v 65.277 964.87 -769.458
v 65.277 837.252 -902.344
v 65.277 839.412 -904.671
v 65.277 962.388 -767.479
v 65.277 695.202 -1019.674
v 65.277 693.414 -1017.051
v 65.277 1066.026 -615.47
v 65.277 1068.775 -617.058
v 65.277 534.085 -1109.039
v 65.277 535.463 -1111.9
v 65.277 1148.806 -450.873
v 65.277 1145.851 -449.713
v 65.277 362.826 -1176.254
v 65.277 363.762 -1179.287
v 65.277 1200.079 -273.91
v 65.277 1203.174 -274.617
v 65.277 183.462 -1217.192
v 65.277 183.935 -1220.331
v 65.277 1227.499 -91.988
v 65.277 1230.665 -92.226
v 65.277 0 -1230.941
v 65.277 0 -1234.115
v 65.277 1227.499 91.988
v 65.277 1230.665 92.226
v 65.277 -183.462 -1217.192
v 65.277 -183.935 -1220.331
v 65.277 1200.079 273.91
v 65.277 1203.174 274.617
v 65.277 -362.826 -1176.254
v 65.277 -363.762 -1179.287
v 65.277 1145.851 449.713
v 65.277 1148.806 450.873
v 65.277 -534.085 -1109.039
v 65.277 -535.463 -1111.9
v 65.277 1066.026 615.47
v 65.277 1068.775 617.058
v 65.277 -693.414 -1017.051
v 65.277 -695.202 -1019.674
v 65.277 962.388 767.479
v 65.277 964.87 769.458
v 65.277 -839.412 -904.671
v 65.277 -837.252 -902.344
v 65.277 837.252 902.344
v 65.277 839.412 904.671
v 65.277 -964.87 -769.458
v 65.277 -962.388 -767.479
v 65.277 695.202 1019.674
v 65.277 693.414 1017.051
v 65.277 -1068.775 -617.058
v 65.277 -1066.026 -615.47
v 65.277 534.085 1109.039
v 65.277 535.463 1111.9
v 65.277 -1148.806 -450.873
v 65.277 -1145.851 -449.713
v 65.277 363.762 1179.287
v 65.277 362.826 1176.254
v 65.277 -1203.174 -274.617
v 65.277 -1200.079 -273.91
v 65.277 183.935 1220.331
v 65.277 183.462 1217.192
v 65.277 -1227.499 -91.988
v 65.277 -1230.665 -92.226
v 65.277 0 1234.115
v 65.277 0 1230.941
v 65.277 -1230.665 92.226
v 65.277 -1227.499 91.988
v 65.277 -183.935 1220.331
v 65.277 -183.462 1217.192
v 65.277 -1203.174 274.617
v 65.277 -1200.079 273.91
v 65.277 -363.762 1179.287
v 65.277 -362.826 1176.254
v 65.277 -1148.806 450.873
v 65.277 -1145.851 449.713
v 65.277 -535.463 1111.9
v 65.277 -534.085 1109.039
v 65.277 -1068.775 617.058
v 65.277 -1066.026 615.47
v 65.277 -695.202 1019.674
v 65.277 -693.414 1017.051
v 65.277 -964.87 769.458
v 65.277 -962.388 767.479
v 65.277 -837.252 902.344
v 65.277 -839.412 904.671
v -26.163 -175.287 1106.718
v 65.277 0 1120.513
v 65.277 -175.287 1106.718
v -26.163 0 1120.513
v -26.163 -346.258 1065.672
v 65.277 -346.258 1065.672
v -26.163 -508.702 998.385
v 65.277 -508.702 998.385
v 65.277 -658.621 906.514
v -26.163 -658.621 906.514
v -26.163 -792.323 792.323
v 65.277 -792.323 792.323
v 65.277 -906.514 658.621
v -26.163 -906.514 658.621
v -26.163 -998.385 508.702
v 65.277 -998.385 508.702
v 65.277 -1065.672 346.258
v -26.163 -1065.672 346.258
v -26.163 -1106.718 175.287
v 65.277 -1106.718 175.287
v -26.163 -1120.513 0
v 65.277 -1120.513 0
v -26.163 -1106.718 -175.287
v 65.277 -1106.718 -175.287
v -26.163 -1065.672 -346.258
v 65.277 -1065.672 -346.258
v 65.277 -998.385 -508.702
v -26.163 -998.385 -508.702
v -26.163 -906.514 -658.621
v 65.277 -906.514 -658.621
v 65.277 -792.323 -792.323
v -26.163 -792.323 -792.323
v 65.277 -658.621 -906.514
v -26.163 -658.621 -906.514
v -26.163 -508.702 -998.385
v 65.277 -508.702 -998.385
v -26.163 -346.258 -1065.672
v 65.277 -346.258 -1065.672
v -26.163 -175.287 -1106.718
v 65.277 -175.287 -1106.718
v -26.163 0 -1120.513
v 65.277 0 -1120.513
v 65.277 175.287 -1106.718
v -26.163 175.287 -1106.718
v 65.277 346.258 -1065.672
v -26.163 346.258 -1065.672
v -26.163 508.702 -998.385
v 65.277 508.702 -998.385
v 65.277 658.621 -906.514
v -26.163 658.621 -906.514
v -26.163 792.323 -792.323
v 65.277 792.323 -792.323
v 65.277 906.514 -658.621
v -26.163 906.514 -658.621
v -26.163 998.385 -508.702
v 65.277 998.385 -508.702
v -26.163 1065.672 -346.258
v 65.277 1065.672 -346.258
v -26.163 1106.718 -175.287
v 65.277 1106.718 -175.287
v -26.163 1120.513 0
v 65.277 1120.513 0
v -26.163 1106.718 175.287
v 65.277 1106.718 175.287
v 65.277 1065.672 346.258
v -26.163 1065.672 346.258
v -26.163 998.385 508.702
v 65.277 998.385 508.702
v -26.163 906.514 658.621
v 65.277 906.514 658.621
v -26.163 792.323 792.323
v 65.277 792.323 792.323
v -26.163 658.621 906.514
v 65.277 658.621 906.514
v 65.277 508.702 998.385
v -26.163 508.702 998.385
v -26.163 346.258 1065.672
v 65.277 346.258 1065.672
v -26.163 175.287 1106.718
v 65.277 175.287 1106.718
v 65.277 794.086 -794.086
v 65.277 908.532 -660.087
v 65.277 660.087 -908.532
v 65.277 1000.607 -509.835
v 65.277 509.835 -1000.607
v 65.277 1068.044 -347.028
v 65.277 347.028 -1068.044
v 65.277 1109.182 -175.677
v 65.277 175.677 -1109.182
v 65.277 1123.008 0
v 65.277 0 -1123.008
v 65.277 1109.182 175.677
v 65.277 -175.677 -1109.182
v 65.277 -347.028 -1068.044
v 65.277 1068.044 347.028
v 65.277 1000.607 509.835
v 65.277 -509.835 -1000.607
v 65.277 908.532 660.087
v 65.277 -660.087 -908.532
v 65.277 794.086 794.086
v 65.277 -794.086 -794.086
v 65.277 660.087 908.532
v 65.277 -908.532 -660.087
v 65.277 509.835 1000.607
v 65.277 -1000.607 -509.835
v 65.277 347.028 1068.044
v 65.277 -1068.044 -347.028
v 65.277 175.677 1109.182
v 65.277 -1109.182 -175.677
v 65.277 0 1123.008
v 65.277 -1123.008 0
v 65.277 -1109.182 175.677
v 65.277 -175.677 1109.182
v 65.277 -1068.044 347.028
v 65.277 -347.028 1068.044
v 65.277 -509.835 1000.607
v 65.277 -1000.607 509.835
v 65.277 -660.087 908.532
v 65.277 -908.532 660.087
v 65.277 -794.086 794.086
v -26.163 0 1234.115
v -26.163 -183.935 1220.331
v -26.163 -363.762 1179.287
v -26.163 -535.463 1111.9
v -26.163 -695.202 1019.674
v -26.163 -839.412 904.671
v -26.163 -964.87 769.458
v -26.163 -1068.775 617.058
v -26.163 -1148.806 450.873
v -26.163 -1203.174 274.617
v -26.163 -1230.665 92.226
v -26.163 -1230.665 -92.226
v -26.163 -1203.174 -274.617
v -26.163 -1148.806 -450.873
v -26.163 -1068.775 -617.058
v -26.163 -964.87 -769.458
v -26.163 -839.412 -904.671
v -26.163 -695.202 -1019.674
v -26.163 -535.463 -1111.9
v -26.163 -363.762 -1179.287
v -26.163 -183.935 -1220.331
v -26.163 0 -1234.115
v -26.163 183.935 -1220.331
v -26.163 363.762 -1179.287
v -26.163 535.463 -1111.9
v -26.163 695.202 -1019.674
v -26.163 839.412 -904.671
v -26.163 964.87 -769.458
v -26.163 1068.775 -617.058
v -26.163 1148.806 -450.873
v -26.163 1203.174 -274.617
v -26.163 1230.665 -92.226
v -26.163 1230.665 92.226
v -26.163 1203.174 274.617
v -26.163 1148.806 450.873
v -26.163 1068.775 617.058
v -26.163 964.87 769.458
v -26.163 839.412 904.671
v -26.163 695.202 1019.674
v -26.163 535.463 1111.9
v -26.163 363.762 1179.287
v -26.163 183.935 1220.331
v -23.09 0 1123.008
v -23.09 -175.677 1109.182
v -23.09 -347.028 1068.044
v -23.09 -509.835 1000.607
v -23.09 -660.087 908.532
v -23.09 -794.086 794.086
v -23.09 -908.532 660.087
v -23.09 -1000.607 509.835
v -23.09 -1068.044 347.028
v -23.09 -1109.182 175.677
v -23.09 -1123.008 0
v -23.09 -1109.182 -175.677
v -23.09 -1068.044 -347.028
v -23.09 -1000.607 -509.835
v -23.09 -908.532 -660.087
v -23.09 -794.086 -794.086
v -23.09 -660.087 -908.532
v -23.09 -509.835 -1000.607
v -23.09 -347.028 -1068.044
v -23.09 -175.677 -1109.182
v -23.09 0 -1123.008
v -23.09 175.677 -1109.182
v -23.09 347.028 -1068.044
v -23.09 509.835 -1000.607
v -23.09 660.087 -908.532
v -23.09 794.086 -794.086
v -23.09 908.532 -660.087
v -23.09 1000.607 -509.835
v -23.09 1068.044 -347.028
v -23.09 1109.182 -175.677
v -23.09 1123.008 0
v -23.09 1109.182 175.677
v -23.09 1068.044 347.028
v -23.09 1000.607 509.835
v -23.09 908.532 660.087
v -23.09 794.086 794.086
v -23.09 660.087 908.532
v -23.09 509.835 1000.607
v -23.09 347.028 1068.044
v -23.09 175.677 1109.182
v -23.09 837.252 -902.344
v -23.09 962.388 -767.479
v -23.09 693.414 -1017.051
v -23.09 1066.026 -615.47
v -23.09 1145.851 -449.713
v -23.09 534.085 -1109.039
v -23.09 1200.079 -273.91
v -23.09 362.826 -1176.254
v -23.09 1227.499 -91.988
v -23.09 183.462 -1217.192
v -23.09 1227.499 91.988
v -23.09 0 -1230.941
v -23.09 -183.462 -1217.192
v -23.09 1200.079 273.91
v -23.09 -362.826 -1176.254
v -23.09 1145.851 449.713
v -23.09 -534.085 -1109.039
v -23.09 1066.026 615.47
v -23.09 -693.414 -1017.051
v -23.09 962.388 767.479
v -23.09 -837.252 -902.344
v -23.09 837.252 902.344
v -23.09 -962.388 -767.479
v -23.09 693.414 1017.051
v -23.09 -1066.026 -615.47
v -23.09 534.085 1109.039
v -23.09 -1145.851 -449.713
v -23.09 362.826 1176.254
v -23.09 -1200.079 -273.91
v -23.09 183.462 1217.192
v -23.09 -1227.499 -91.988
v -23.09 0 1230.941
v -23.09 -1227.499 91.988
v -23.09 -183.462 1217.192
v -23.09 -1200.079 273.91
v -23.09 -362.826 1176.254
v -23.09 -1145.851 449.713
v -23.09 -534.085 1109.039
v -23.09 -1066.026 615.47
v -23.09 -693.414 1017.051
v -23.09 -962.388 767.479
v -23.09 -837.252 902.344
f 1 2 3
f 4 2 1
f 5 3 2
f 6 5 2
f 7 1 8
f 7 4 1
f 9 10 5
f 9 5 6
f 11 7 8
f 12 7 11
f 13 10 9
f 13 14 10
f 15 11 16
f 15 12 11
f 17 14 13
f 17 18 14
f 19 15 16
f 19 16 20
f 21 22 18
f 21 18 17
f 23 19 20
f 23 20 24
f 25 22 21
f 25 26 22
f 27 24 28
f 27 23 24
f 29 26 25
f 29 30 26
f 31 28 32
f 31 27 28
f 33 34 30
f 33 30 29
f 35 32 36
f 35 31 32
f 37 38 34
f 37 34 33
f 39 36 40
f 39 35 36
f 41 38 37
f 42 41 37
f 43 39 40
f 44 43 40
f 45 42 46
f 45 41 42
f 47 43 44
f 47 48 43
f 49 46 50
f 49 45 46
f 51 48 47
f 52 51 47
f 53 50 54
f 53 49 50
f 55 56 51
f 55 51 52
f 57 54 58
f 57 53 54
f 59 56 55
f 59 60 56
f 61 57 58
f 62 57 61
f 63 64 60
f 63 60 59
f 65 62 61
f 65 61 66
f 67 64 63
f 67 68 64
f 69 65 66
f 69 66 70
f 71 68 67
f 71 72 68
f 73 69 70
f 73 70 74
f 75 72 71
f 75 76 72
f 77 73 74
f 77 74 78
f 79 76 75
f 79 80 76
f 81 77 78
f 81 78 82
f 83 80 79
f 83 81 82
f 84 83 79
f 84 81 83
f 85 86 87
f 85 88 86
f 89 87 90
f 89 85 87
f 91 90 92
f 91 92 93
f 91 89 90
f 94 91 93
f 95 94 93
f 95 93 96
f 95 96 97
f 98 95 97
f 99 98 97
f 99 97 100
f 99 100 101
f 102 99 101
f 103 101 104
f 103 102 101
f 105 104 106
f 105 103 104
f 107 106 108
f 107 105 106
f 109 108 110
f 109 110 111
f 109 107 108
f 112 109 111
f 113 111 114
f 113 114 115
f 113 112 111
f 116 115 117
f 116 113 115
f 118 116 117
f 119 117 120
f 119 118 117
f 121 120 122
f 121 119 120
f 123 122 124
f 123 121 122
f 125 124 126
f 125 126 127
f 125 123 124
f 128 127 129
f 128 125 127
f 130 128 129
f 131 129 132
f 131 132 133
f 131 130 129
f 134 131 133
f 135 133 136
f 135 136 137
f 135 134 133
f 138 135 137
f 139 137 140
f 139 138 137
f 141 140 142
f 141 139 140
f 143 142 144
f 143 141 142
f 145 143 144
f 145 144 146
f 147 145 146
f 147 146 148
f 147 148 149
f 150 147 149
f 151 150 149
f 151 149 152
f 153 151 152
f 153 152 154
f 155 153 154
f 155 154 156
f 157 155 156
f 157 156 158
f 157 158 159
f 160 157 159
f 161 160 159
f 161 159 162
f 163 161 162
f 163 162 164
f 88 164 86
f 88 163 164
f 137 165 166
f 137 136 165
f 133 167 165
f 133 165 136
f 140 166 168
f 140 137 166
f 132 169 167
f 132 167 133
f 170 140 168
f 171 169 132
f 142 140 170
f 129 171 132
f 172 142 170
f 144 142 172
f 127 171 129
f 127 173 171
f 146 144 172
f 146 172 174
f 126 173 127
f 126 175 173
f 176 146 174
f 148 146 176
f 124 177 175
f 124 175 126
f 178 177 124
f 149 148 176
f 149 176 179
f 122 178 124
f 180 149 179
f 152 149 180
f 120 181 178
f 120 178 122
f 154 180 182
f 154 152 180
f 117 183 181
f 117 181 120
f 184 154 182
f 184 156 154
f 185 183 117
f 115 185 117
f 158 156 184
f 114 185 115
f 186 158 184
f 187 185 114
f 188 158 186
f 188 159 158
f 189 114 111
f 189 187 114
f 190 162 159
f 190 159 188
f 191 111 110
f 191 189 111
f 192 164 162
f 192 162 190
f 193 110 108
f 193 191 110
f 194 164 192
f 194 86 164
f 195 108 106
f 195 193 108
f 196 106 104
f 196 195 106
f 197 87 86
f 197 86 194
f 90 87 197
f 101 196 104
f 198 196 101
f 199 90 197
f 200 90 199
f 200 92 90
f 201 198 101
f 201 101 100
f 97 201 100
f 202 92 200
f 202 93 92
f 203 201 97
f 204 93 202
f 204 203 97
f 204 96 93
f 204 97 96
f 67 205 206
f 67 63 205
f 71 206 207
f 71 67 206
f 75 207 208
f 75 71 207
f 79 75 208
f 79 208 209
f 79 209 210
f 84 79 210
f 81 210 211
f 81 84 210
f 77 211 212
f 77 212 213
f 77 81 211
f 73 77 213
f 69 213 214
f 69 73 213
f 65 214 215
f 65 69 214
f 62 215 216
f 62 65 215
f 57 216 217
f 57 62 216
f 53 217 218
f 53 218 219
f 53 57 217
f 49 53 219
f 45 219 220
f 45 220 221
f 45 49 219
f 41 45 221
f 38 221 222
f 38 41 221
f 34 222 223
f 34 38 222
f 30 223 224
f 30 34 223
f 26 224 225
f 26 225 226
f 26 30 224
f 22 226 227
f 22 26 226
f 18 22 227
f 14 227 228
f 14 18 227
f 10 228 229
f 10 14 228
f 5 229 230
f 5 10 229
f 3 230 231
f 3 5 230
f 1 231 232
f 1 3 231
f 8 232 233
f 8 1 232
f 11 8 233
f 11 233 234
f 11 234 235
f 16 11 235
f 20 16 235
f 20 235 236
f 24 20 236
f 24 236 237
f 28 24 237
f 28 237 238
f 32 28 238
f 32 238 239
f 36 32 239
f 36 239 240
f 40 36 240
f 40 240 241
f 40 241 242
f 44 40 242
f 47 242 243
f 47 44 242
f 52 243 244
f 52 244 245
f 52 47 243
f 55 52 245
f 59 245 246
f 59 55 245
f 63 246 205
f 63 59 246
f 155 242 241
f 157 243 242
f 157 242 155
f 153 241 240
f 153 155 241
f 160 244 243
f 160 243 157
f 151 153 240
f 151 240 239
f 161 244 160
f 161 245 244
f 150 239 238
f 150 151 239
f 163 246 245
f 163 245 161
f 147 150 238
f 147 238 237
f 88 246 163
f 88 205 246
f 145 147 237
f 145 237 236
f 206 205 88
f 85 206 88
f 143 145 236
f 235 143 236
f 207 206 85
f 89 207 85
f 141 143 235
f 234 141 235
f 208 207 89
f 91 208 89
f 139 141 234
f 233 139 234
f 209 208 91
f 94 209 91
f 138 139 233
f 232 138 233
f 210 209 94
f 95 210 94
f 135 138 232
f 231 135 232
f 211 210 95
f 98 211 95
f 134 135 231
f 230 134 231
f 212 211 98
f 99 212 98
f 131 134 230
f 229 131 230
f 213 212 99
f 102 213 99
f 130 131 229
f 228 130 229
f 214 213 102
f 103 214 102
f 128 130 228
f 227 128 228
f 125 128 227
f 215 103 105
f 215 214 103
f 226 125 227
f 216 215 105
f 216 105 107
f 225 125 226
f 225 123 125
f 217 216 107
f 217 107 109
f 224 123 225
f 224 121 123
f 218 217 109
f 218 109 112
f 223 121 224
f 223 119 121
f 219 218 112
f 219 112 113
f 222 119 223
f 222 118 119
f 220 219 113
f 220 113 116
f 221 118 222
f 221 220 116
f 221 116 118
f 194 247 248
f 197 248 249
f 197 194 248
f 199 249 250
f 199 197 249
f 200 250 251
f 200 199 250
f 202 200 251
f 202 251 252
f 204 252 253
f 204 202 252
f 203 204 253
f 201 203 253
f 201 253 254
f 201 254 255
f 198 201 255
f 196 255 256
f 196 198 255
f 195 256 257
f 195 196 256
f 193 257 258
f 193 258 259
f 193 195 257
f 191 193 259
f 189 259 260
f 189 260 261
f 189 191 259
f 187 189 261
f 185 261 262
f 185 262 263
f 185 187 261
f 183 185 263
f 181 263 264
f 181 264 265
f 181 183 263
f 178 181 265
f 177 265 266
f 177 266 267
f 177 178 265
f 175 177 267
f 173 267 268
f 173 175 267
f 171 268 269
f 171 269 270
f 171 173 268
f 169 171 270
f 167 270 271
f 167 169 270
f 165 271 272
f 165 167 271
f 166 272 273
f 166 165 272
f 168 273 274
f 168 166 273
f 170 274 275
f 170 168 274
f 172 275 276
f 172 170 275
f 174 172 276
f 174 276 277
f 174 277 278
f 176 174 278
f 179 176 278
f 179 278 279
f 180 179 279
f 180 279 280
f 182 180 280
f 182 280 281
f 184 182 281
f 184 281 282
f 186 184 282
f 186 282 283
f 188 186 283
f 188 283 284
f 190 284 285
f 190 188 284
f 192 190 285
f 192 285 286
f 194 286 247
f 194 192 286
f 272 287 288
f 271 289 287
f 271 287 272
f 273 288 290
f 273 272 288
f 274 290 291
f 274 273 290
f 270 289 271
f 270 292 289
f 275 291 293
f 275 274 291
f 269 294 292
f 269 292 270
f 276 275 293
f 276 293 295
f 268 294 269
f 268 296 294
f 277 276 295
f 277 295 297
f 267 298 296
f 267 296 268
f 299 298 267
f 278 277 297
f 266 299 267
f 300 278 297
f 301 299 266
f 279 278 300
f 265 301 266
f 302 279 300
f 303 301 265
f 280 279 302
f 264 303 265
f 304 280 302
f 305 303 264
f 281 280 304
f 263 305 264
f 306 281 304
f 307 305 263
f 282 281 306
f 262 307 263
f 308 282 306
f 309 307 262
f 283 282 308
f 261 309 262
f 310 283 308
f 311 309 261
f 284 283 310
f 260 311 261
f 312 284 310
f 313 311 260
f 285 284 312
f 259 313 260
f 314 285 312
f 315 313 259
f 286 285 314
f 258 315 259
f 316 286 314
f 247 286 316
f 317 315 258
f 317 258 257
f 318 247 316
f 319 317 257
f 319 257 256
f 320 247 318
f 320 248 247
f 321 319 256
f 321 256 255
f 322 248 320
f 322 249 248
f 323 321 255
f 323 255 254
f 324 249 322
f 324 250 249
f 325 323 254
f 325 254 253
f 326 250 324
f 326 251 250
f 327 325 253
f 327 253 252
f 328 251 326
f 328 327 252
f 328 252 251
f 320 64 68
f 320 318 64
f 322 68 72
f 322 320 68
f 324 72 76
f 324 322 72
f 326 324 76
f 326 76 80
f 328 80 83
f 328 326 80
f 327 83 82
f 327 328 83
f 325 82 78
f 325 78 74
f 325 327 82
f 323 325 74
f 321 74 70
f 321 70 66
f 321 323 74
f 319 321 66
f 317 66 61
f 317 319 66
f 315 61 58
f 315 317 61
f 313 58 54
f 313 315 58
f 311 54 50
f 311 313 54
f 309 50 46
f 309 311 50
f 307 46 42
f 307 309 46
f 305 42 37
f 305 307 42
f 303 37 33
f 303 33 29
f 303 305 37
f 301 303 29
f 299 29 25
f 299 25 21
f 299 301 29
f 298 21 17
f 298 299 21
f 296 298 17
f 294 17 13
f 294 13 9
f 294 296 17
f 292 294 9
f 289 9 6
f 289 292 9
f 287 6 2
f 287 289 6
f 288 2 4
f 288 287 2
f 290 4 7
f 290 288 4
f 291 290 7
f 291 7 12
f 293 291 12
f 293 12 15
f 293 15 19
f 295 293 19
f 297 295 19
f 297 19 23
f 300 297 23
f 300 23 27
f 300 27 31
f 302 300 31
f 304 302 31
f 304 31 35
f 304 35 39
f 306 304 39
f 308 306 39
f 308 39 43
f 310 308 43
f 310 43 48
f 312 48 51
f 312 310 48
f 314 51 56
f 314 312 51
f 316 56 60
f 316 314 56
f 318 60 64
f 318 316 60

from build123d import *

# Parameters (mm, degrees)
SCALE1_SCALE = 12


with BuildPart() as part:
    # Sketch1 → Revolve1 (revolve)
    with BuildSketch(Plane.XY, mode=Mode.PRIVATE) as revolve1_sk:
        Polygon((0.256064819, 102.578406094), (0.256064819, 93.583973152), (7.62, 93.583973152), (7.62, 93.376118609), (0, 93.376118609), (0, 102.842948239), (7.62, 102.842948239), (7.62, 102.578406094), align=None)
    revolve(revolve1_sk.sketch.rotate(Axis((-297.054464827, 0, 0), (1, 0, 0)), 90), axis=Axis((-297.054464827, 0, 0), (1, 0, 0)))


with BuildPart() as part_1:
    # Scale1: scaled about (2.378428564, 0, 0)
    add(part.part.scale(SCALE1_SCALE).moved(Location((-26.162714204, 0, 0))))


solid = part_1.part
